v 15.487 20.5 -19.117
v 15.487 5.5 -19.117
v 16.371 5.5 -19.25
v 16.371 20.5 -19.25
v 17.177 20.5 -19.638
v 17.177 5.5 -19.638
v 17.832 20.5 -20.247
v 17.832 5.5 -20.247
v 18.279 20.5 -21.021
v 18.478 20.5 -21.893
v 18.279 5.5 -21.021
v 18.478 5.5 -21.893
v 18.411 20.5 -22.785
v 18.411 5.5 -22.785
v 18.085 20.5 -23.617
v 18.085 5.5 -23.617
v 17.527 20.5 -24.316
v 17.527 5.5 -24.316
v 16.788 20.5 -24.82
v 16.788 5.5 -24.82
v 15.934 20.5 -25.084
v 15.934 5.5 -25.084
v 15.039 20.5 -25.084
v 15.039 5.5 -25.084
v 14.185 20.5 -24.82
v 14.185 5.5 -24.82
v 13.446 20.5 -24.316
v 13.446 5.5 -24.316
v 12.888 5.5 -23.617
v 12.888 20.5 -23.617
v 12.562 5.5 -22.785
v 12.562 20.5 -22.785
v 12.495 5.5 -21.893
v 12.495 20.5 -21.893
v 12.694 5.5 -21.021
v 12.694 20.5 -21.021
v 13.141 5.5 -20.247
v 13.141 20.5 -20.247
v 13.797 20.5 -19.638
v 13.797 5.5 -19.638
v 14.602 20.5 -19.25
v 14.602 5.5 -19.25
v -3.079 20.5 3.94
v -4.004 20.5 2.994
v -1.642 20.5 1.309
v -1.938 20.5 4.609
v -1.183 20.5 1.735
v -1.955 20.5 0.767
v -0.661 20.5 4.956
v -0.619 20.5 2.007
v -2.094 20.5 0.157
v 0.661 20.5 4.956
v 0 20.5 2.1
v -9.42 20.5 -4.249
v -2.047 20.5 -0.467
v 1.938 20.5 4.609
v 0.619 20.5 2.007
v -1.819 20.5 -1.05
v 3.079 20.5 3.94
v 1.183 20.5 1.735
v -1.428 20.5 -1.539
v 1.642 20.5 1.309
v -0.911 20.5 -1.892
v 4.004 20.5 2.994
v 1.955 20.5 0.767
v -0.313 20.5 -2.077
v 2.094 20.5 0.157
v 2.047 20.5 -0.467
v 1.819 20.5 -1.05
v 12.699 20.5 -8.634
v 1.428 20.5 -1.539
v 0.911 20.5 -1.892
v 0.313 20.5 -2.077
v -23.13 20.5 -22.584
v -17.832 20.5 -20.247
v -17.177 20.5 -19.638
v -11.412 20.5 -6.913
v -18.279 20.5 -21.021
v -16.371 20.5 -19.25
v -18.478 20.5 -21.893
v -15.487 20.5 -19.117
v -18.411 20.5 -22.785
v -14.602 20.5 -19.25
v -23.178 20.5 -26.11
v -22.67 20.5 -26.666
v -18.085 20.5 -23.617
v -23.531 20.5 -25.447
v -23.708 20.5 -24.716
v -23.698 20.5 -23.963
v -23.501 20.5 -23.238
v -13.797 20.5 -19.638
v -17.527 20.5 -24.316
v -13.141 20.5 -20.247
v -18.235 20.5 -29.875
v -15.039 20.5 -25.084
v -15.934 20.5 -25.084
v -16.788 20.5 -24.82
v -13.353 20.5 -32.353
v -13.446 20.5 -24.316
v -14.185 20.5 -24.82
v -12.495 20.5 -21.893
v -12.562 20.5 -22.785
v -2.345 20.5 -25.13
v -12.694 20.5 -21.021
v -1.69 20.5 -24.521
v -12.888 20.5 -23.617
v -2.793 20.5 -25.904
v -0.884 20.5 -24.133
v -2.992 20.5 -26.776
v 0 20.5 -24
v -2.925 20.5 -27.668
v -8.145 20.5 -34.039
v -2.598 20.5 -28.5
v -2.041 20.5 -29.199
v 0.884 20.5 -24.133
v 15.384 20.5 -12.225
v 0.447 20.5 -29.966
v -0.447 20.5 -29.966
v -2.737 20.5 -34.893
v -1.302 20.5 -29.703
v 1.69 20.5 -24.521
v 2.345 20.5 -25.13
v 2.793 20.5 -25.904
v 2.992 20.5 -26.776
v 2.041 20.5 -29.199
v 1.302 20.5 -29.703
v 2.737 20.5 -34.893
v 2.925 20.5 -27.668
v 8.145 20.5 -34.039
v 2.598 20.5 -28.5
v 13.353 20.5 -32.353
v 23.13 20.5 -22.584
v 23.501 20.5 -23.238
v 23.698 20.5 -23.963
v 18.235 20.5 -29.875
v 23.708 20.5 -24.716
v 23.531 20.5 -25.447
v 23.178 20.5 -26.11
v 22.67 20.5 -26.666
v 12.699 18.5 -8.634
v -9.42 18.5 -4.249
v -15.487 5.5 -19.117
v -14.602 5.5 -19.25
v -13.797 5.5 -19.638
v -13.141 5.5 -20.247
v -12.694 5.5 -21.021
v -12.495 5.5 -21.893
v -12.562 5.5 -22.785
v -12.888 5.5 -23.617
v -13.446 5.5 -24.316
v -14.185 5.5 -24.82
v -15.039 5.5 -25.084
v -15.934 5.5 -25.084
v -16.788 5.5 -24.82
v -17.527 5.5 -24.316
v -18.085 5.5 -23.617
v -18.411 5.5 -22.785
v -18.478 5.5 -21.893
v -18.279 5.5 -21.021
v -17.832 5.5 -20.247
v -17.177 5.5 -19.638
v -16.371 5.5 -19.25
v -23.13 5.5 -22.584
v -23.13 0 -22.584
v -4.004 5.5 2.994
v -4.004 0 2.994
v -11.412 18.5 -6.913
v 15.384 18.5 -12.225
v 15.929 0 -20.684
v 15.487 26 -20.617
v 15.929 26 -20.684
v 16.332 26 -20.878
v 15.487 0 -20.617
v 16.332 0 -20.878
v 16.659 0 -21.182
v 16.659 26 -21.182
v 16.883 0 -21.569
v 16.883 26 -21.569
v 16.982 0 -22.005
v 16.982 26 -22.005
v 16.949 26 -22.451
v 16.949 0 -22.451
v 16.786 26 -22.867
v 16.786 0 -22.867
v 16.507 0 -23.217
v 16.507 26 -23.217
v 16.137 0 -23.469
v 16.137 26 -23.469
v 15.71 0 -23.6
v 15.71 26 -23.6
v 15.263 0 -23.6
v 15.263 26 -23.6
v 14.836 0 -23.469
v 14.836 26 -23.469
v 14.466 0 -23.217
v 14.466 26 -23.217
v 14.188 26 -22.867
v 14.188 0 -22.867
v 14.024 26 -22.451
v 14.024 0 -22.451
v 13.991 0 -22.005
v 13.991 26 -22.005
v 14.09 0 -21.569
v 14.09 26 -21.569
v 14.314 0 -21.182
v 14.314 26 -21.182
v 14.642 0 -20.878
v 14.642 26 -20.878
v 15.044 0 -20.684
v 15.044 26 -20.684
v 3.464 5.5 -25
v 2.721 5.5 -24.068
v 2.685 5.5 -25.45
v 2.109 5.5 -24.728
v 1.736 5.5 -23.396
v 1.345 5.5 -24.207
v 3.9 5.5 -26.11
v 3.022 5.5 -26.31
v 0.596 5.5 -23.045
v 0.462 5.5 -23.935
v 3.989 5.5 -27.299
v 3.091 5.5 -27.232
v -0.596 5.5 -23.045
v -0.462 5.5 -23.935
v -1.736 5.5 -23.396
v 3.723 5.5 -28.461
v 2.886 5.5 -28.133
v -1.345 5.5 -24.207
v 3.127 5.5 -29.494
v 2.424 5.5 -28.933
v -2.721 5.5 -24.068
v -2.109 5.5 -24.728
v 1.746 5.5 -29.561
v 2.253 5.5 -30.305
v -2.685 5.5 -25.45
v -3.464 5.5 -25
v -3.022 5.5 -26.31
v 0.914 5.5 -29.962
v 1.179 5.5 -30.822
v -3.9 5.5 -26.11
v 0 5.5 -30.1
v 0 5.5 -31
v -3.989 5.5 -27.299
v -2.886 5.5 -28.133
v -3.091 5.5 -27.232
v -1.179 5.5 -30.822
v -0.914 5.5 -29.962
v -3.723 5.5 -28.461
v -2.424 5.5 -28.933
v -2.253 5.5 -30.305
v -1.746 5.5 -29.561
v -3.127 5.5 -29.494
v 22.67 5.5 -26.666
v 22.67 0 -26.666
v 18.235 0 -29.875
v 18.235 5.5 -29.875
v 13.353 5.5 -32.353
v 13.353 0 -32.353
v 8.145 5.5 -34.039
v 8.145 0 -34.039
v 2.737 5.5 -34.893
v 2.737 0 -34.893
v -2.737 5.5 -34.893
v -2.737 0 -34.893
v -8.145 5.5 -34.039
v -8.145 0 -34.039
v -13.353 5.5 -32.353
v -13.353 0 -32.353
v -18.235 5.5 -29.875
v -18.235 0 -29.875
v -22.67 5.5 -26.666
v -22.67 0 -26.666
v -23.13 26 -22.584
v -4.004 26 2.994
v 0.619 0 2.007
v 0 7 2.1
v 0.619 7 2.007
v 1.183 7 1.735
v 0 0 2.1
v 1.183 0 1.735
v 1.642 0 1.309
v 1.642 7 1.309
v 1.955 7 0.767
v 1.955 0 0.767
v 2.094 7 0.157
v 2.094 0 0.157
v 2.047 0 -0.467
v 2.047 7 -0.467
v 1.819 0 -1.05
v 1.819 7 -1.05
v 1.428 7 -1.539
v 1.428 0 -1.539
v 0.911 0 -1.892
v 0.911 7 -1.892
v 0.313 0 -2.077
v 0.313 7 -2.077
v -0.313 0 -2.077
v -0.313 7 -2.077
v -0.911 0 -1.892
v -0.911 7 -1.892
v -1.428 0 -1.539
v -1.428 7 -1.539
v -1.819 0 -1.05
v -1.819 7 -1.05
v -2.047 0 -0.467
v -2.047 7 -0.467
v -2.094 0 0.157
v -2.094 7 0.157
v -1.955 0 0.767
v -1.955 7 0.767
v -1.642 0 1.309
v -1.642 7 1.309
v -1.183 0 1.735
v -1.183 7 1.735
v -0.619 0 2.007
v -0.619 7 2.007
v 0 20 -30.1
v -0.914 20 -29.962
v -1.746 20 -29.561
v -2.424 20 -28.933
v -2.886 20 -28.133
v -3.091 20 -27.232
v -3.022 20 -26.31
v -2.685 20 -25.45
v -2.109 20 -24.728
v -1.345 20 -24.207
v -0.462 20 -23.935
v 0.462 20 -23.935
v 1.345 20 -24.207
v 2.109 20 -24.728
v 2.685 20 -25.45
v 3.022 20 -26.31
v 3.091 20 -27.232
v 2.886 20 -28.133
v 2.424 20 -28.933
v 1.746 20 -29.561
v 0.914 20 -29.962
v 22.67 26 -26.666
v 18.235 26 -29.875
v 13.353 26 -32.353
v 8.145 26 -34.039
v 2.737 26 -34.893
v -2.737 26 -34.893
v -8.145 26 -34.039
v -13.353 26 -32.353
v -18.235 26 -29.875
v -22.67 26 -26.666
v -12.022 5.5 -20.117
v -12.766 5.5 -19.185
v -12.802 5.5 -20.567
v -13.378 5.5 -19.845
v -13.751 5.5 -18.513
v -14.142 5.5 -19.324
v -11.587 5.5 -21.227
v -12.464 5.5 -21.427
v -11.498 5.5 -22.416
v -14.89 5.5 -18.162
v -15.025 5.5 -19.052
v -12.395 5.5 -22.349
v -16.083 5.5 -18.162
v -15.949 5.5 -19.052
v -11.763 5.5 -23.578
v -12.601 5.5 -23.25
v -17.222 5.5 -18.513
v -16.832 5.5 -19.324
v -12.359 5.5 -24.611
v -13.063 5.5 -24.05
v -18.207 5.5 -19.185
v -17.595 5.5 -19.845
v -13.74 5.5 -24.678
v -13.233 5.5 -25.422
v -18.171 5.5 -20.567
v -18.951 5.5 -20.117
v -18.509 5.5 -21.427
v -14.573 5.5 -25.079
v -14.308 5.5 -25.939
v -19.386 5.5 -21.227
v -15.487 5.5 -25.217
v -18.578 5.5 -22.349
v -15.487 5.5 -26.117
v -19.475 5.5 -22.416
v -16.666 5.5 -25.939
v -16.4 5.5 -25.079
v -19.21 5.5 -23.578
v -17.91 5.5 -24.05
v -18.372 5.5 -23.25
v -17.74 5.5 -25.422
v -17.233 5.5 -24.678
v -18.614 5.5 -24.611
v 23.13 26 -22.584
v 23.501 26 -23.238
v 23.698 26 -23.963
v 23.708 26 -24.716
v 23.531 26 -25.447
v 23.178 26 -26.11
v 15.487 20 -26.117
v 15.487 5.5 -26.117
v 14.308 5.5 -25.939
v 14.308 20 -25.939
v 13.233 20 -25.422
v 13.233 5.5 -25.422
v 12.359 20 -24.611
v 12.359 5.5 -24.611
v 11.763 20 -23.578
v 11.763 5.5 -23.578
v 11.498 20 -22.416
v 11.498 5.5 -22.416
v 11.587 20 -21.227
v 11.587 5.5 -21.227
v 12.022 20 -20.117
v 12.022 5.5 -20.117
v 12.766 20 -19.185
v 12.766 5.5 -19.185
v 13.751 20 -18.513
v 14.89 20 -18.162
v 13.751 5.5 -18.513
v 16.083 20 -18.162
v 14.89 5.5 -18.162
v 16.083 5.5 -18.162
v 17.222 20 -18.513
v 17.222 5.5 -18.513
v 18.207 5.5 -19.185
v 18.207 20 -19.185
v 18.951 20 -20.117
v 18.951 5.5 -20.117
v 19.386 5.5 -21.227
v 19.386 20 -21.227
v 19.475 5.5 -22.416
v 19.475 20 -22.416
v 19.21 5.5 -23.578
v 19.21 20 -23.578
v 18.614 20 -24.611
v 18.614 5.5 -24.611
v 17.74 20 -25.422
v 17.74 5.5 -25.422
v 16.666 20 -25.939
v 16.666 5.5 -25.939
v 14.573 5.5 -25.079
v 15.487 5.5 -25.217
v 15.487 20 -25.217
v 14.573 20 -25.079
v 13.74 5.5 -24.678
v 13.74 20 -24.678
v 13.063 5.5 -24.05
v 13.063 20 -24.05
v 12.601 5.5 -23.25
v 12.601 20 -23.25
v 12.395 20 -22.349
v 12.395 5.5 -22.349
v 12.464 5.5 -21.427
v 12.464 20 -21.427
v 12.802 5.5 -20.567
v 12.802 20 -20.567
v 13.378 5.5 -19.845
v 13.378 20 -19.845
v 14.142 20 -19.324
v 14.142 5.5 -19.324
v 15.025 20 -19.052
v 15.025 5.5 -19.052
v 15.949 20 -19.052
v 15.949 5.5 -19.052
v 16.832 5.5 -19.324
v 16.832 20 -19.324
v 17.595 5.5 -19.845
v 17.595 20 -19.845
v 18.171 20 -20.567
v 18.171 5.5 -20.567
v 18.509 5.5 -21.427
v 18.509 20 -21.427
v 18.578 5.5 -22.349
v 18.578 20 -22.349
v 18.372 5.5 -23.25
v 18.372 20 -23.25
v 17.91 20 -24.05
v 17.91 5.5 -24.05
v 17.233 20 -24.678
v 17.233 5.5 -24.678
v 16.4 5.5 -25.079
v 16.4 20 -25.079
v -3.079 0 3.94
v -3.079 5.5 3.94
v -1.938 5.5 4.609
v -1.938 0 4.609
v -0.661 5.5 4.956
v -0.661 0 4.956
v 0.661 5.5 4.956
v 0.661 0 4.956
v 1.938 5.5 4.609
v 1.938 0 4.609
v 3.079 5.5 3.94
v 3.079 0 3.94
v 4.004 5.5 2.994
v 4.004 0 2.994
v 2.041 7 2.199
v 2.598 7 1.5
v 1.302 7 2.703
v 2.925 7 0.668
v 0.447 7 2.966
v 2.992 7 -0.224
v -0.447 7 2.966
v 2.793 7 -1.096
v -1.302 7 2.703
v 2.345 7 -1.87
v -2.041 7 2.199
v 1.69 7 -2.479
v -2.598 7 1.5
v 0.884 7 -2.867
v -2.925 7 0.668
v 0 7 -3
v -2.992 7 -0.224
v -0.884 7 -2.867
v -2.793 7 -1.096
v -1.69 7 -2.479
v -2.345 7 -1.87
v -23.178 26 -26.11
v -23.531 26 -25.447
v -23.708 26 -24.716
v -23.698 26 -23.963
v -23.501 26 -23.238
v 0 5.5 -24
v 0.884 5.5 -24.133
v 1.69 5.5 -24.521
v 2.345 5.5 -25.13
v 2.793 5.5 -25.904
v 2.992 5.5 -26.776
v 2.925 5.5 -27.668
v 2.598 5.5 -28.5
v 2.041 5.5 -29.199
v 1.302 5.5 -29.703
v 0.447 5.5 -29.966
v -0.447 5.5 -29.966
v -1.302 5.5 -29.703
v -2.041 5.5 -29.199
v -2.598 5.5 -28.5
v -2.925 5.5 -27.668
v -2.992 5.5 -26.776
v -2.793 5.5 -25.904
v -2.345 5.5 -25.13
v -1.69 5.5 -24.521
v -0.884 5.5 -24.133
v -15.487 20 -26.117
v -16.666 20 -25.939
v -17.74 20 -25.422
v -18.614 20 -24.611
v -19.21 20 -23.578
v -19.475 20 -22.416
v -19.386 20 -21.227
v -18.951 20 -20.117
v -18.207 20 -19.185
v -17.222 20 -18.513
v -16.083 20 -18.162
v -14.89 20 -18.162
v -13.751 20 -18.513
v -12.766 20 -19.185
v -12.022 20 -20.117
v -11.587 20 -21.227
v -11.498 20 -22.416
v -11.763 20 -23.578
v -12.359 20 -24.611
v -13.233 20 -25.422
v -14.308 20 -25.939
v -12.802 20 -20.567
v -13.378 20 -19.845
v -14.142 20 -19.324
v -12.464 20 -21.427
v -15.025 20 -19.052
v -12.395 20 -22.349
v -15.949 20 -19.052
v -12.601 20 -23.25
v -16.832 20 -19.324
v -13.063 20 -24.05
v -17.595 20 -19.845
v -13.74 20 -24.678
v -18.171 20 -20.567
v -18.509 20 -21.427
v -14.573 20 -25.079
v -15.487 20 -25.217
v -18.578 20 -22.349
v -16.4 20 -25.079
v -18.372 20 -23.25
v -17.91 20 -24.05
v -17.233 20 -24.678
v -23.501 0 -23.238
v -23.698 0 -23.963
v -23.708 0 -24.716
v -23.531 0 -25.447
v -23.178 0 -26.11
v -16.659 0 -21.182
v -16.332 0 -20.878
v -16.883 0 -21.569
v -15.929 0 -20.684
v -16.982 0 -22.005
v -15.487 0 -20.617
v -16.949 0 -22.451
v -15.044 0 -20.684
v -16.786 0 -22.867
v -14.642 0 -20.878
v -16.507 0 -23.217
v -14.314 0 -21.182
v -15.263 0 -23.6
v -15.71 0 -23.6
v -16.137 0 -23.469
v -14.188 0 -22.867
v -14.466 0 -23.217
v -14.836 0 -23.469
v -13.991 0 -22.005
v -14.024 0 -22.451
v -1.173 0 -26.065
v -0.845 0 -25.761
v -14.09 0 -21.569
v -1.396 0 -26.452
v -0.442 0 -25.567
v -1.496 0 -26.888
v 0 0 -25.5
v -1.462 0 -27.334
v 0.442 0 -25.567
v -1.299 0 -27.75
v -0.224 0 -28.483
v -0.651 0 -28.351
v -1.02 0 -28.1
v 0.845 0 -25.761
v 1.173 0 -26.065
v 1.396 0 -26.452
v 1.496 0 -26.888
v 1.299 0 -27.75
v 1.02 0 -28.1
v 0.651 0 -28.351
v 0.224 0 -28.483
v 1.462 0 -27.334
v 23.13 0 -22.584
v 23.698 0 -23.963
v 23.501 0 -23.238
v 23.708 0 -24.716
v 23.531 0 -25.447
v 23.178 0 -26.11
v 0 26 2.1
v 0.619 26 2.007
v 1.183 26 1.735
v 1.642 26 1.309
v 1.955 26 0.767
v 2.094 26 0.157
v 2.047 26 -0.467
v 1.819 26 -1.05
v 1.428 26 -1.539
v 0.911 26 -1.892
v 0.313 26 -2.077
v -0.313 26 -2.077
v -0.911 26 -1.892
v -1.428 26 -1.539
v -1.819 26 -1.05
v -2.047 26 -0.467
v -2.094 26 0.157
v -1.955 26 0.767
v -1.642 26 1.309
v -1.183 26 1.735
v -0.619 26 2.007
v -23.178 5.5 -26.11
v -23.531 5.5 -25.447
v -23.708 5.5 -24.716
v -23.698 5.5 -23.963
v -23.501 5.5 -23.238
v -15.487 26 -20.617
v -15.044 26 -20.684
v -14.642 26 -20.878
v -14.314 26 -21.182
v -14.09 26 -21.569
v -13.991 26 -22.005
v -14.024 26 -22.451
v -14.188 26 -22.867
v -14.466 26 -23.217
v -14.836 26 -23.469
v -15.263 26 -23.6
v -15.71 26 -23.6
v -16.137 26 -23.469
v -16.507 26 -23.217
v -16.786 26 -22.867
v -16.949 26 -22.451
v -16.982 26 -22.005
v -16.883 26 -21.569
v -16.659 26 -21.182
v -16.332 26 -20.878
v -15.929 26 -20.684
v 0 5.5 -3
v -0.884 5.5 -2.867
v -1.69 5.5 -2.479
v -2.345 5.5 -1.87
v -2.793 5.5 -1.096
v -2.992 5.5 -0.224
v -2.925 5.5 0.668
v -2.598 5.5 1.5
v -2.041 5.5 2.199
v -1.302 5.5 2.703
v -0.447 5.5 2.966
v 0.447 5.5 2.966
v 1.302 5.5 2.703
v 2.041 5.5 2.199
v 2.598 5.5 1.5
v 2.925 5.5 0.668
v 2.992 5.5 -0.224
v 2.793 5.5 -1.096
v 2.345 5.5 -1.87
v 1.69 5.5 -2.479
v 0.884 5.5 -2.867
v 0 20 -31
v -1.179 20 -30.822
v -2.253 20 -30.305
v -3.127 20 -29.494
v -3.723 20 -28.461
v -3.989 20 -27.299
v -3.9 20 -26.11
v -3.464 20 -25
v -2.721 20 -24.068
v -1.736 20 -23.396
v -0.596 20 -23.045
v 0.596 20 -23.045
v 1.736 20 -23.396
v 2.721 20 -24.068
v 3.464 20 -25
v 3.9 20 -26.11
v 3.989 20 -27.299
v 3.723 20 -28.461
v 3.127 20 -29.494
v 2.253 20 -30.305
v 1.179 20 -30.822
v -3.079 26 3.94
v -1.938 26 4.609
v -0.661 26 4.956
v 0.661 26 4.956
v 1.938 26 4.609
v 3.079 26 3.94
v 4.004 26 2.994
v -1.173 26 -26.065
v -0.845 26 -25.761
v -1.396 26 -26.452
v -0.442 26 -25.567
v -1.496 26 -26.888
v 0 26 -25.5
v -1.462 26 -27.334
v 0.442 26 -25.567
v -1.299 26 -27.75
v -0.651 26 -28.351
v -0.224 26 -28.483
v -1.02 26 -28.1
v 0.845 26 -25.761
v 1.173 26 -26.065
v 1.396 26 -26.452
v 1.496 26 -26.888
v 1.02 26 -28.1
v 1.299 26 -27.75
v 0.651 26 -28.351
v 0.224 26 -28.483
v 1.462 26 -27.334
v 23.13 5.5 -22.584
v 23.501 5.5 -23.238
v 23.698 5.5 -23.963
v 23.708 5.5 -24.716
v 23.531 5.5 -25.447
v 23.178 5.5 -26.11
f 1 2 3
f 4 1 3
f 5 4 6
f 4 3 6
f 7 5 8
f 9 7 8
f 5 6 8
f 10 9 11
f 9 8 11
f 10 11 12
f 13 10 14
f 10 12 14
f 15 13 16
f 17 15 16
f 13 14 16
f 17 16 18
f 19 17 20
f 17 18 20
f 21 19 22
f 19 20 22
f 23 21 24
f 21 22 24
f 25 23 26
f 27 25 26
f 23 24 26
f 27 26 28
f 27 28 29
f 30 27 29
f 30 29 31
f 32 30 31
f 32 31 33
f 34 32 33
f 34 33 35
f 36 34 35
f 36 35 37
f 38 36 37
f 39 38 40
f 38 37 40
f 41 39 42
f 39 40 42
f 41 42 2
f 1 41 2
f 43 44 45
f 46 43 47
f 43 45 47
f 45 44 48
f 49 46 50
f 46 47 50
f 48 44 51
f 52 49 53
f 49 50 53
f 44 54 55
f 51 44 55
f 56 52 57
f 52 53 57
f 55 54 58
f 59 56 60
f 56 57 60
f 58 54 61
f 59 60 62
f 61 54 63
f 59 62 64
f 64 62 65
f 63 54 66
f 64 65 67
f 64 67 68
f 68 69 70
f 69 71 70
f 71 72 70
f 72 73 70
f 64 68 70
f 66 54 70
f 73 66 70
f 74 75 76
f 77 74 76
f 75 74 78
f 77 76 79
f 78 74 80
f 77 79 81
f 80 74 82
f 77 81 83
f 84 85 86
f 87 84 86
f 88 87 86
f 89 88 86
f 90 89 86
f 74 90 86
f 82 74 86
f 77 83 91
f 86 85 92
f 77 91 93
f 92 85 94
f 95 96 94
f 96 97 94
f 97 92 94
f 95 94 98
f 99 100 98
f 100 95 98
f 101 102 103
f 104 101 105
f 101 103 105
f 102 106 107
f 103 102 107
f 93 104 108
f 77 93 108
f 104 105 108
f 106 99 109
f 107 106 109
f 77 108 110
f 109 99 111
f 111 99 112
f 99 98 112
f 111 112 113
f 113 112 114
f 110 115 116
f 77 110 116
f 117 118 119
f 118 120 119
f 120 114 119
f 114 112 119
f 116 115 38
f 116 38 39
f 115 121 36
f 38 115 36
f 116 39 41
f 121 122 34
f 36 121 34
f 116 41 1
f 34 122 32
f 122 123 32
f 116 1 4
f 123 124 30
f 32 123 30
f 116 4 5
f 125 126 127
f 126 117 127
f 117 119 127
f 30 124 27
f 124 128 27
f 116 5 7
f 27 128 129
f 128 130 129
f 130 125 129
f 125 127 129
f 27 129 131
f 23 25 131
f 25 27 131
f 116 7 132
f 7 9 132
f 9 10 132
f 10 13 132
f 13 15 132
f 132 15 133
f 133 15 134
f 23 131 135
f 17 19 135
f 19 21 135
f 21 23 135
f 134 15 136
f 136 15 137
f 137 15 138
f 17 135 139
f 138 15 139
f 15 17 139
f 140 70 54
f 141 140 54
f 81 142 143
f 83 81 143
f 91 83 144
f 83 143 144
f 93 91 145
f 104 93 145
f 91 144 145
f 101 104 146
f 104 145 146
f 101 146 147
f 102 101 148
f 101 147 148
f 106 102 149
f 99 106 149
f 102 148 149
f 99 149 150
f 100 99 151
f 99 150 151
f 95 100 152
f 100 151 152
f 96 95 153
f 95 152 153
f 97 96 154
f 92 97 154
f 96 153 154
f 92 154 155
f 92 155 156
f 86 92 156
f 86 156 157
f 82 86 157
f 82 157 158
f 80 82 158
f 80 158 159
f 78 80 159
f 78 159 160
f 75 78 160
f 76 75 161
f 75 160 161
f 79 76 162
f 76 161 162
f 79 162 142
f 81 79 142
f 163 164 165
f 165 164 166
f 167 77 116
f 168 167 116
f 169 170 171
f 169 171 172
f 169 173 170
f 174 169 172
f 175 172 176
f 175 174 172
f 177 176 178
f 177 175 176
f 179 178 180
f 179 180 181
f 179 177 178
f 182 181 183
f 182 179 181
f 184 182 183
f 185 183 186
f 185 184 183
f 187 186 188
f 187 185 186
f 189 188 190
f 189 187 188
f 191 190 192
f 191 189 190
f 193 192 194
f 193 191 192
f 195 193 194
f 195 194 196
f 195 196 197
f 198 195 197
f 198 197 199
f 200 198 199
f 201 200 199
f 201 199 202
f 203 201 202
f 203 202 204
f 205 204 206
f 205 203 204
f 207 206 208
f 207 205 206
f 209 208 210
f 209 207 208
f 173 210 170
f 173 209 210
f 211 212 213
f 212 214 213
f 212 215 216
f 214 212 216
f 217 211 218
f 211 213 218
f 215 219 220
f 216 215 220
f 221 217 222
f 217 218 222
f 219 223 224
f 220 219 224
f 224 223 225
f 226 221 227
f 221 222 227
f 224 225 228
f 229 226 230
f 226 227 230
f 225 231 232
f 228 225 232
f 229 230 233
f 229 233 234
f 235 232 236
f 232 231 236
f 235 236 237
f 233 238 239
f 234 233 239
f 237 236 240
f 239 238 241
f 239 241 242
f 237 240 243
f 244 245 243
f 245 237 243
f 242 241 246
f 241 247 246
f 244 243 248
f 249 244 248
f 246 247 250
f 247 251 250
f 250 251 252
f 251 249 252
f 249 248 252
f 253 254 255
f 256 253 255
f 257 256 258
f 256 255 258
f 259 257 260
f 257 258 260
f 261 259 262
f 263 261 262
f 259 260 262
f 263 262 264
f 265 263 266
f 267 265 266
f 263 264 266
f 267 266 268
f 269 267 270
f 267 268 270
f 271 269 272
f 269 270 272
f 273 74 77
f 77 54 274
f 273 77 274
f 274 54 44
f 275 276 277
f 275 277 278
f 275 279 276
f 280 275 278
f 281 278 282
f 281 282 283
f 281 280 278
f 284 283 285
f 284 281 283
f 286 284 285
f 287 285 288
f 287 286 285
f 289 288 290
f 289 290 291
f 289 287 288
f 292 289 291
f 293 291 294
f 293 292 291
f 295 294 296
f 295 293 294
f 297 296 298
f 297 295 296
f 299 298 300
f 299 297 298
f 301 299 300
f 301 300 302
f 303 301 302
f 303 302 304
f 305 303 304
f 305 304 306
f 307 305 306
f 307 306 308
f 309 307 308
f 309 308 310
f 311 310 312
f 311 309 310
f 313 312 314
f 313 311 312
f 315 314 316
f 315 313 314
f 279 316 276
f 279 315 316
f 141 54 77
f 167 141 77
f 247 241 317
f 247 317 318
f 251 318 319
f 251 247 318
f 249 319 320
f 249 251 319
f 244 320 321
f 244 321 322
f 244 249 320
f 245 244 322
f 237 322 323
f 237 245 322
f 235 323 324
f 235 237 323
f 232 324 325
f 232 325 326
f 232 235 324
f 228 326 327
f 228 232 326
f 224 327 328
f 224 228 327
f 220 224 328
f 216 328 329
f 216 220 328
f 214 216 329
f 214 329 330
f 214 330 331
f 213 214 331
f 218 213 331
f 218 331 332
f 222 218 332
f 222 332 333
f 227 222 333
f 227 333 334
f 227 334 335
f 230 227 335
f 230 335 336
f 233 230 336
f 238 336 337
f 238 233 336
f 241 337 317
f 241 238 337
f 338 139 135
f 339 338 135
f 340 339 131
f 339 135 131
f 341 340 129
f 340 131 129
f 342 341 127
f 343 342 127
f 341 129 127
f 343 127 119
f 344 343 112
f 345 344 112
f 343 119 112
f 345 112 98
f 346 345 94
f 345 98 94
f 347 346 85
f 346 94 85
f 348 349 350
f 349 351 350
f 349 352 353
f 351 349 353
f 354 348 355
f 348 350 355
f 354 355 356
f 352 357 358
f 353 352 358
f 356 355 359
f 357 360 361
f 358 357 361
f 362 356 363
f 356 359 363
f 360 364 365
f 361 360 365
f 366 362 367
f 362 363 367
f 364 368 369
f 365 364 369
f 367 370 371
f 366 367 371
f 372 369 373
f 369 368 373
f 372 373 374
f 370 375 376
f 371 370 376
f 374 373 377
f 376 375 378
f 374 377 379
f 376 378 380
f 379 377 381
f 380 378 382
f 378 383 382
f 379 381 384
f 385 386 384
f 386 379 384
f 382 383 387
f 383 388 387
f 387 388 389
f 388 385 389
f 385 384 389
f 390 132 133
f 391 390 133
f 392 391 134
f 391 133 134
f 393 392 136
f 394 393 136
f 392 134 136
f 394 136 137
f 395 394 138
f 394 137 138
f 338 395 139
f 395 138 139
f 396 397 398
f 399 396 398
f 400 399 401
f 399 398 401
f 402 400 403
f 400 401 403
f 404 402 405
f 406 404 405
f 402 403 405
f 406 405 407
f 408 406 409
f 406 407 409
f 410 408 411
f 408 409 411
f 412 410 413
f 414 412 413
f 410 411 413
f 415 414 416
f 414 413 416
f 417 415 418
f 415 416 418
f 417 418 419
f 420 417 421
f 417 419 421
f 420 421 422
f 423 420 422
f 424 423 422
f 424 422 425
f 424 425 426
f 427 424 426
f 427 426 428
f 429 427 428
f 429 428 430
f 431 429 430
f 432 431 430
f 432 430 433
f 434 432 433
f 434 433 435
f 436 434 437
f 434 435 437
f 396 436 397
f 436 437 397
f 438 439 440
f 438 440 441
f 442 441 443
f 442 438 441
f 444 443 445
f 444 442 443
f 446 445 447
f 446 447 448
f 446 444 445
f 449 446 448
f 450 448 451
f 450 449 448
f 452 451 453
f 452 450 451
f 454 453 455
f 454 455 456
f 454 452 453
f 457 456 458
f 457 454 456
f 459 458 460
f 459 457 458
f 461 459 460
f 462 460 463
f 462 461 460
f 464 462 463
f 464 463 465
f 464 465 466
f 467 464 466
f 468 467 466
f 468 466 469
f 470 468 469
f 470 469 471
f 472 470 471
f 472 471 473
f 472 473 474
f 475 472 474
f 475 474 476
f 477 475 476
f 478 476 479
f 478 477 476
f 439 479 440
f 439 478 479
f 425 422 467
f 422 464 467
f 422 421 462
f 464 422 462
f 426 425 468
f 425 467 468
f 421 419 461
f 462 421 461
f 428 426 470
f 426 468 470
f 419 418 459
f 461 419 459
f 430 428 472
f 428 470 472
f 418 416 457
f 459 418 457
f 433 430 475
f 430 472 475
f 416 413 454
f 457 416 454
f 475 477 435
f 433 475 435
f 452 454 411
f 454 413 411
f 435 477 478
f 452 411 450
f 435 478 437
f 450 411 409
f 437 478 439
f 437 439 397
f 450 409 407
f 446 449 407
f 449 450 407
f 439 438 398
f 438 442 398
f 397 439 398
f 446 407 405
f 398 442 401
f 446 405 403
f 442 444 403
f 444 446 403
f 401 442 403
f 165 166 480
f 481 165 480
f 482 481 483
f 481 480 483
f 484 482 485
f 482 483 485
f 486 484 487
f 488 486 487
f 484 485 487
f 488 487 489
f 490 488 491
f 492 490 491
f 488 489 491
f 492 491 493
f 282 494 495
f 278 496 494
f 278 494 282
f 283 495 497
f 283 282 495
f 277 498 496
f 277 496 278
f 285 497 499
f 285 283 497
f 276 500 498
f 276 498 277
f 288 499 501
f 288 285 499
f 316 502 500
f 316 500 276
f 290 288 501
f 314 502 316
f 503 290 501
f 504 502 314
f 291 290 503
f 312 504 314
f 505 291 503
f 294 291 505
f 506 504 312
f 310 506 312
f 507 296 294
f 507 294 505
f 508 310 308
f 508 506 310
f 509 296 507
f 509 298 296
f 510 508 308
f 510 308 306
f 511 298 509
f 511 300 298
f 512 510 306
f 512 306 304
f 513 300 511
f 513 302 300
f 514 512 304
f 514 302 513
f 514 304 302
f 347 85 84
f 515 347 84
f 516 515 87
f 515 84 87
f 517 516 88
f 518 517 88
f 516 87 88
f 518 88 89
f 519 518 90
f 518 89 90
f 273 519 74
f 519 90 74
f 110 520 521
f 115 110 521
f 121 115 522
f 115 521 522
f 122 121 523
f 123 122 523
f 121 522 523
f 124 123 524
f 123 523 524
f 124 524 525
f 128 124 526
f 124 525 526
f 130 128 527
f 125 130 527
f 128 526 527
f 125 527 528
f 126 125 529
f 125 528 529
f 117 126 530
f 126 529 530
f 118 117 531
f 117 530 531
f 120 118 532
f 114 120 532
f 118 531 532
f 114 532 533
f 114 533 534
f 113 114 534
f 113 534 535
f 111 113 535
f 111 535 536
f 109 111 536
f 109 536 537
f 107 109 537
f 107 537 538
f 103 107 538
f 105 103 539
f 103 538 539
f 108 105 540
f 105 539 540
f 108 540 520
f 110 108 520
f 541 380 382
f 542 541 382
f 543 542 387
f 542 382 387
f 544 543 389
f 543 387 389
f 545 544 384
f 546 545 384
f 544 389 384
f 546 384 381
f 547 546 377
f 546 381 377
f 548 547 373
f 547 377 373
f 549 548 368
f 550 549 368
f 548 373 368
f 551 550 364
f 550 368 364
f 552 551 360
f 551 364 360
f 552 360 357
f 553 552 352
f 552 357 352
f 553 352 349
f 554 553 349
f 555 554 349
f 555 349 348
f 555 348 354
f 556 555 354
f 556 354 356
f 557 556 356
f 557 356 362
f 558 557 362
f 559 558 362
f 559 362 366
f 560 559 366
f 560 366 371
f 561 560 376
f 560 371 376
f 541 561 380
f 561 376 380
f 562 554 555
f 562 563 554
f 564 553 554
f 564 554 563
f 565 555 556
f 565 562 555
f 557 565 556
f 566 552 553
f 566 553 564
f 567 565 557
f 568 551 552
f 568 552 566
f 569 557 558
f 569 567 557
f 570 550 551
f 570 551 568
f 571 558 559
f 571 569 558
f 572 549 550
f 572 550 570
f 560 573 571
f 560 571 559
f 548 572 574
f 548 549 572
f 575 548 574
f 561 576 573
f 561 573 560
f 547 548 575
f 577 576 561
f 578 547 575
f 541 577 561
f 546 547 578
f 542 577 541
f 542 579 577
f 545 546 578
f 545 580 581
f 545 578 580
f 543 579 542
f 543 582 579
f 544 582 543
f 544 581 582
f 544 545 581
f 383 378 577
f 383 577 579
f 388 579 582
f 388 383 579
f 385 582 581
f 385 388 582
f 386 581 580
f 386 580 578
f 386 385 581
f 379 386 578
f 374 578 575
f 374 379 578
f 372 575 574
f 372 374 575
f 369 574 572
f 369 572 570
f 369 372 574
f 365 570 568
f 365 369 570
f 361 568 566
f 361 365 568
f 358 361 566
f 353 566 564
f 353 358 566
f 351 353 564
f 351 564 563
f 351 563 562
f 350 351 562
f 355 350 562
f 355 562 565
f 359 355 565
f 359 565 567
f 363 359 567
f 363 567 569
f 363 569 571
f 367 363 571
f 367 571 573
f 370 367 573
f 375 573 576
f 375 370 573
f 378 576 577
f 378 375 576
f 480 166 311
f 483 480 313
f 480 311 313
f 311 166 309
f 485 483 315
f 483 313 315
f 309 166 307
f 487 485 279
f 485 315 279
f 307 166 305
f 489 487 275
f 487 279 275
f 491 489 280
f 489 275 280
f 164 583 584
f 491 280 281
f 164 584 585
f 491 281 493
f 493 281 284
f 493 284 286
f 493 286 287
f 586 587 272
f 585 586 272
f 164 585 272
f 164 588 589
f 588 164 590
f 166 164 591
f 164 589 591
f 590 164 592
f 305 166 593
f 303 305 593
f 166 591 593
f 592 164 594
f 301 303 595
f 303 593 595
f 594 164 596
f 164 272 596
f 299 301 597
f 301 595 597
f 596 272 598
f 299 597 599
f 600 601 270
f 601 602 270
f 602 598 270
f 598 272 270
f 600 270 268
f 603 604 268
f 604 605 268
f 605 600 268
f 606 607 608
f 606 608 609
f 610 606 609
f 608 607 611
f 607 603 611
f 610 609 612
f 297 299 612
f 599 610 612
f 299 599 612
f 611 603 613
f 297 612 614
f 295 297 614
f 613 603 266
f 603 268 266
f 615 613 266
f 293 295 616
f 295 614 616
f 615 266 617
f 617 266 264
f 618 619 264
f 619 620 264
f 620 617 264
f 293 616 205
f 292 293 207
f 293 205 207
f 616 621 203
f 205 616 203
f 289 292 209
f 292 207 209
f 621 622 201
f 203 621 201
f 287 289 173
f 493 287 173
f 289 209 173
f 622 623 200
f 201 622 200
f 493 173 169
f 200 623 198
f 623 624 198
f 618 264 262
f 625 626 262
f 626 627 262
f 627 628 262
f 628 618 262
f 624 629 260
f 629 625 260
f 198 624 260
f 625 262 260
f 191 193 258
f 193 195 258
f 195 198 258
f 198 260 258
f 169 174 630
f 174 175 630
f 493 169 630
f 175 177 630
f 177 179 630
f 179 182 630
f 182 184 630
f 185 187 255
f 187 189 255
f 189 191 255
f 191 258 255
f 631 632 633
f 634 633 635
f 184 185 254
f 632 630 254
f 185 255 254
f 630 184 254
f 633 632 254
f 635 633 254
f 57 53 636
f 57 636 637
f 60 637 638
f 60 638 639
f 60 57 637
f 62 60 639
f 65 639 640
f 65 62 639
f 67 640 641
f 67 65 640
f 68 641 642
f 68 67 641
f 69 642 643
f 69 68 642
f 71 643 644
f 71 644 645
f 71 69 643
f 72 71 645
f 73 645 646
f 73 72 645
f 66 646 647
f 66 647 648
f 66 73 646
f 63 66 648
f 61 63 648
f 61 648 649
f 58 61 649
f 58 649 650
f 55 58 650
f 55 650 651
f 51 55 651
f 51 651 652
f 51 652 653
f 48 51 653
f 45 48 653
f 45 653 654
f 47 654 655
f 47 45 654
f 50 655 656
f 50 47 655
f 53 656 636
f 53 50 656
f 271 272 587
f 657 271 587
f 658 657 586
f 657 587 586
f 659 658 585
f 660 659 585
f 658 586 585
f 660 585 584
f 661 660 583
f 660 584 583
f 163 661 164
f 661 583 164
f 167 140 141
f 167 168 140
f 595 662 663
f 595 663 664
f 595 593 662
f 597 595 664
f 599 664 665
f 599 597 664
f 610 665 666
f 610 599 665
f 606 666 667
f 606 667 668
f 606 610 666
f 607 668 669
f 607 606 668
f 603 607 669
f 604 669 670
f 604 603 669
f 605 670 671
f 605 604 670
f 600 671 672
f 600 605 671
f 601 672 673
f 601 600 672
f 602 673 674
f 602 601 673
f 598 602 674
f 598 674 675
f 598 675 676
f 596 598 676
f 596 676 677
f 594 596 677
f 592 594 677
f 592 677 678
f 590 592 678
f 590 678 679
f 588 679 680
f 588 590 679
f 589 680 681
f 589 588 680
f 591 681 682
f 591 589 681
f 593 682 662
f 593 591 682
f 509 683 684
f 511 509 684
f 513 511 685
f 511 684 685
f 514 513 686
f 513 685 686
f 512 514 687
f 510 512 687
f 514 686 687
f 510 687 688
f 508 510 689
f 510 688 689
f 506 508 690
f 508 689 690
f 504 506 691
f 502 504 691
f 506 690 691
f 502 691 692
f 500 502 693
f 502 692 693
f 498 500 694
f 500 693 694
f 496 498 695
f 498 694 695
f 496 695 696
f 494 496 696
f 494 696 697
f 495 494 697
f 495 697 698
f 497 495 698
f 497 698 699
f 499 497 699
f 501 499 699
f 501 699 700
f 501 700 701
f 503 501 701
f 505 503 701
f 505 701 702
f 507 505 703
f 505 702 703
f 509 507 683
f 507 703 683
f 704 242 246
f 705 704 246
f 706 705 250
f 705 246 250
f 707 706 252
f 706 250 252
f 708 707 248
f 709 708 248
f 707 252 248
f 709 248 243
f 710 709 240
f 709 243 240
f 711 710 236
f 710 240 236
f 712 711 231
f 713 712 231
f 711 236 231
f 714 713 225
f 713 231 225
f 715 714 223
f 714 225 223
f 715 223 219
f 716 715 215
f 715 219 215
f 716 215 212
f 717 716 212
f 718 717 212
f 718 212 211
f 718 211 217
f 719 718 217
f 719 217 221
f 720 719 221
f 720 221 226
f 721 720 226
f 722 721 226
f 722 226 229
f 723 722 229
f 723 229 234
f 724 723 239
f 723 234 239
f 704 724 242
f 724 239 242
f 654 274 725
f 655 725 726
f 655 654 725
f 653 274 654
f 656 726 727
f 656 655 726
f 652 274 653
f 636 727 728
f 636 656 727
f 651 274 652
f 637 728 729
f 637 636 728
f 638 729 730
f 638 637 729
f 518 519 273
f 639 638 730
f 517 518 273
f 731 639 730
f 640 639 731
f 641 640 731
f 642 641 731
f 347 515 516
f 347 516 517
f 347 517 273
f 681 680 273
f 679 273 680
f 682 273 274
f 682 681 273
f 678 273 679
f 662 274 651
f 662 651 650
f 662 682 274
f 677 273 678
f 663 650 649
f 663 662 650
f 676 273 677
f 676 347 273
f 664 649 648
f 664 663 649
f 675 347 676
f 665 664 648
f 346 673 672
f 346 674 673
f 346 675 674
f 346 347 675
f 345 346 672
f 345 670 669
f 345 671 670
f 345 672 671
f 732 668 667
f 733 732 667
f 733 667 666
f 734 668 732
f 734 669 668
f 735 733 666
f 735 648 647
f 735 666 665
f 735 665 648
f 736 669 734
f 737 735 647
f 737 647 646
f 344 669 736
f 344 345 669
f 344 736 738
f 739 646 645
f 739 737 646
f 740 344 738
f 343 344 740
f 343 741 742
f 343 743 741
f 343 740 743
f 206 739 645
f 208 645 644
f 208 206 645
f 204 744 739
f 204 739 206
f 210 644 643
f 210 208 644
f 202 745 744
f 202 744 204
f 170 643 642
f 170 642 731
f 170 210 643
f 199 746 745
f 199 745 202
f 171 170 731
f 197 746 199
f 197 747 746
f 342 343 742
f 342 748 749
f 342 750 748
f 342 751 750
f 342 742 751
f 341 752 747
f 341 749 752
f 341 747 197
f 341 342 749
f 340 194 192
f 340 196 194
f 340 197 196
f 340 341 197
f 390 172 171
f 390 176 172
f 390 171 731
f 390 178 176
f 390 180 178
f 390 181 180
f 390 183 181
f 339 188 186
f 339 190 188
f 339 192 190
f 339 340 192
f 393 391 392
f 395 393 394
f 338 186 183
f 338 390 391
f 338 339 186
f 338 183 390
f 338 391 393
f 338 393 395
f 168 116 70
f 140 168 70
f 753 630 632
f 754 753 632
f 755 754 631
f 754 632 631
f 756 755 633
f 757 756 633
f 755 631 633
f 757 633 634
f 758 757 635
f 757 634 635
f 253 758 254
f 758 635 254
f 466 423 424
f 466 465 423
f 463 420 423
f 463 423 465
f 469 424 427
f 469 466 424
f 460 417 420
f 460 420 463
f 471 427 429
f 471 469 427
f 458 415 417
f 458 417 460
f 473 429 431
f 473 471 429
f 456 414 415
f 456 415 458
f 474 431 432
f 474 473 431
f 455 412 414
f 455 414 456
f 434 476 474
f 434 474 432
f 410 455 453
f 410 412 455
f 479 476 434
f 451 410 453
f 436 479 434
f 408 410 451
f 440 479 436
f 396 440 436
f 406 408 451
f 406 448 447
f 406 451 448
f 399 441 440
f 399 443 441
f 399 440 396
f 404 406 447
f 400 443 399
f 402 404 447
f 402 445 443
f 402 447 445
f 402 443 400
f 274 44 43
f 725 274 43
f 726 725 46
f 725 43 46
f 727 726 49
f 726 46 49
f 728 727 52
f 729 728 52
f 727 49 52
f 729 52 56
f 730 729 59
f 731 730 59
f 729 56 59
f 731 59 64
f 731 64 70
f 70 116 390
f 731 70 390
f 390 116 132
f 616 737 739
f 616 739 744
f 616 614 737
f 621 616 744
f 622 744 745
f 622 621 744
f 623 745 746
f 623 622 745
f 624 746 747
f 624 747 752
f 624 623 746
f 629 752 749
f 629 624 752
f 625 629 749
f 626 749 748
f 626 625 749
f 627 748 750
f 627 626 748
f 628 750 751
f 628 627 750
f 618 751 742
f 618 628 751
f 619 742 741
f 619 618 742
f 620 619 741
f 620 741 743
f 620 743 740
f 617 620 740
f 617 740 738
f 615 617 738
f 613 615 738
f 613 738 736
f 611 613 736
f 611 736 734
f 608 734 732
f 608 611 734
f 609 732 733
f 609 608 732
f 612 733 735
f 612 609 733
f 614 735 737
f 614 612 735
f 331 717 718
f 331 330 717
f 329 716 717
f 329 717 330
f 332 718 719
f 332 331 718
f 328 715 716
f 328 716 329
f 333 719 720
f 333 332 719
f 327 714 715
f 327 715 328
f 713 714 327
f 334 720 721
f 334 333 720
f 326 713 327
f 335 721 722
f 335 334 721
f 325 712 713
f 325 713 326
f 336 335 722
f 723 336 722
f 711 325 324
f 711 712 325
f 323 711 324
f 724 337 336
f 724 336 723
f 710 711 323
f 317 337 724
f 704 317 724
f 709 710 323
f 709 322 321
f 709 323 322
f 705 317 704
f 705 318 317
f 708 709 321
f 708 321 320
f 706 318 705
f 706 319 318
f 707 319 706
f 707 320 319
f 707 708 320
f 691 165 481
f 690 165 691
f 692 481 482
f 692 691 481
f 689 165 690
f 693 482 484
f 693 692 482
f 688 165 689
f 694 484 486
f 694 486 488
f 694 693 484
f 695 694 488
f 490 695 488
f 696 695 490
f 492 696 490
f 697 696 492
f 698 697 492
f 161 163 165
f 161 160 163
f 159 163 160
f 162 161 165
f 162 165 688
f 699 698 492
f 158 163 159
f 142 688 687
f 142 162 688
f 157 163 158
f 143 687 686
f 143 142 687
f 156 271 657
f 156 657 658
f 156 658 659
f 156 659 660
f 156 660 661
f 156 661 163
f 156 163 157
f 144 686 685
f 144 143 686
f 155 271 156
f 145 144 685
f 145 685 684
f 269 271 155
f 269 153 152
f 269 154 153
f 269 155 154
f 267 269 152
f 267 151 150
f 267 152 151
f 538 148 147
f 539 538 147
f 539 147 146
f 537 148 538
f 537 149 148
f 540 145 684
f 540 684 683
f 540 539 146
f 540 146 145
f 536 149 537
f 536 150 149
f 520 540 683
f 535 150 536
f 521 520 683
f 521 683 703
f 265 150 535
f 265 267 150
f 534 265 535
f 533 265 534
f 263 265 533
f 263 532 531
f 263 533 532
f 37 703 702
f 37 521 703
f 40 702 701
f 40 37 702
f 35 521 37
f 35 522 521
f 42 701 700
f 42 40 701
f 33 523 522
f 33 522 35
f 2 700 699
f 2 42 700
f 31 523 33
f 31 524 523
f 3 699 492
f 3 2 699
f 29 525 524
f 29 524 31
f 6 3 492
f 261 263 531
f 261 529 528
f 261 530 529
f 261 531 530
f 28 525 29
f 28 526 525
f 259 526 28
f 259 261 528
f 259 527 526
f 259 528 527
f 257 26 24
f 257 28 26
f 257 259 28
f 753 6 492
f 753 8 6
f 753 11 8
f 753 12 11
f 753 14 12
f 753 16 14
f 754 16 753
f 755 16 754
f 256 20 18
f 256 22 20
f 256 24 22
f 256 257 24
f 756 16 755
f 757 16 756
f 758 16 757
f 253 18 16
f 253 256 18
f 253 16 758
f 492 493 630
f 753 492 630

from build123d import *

# Parameters (mm, degrees)
SKETCH_1_R        = 2.1
SKETCH_1_R_2      = 1.5
EXTRUDE_1_DEPTH   = 5.5
SKETCH_2_R        = 3
SKETCH_2_R_2      = 1.5
EXTRUDE_2_DEPTH   = 15
EXTRUDE_2_2_DEPTH = 15
EXTRUDE_2_3_DEPTH = 15
SKETCH_3_R        = 4
SKETCH_3_R_2      = 3.1
EXTRUDE_3_DEPTH   = 14.5
EXTRUDE_3_2_DEPTH = 14.5
EXTRUDE_3_3_DEPTH = 14.5
EXTRUDE_START     = 20.5
SKETCH_1_2_R      = 2.1
SKETCH_1_2_R_2    = 1.5
EXTRUDE_4_DEPTH   = 5.5
SKETCH_4_R        = 3
SKETCH_4_R_2      = 2.1
EXTRUDE_5_DEPTH   = 1.5
EXTRUDE_6_DEPTH   = 2


with BuildPart() as part:
    # ｽｹｯﾁ1 → ﾎﾞｽ - 押し出し1 (new body)
    with BuildSketch(Plane(origin=(0, 0, 0), x_dir=(1, 0, 0), z_dir=(0, 1, 0))):
        with BuildLine():
            Line((-23.129729925, 22.583524826), (-4.004347333, -2.994194789))
            ThreePointArc((-4.004347333, -2.994194789), (0, -5), (4.004347333, -2.994194789))
            Line((4.004347333, -2.994194789), (23.129729925, 22.583524826))
            ThreePointArc((23.129729925, 22.583524826), (23.708299296, 24.715569788), (22.670289168, 26.665670609))
            ThreePointArc((22.670289168, 26.665670609), (0, 35), (-22.670289168, 26.665670609))
            ThreePointArc((-22.670289168, 26.665670609), (-23.708299296, 24.715569788), (-23.129729925, 22.583524826))
        make_face()
        with Locations(Location((0, 0, 0), (0, 0, 270))):
            Circle(SKETCH_1_R, mode=Mode.SUBTRACT)
        with Locations(Location((-15.486563781, 22.117105196, 0), (0, 0, 270))):
            Circle(SKETCH_1_R_2, mode=Mode.SUBTRACT)
        with Locations(Location((15.486563781, 22.117105196, 0), (0, 0, 270))):
            Circle(SKETCH_1_R_2, mode=Mode.SUBTRACT)
        with Locations(Location((0, 27, 0), (0, 0, 270))):
            Circle(SKETCH_1_R_2, mode=Mode.SUBTRACT)
    extrude(amount=EXTRUDE_1_DEPTH)



with BuildPart() as body_2:
    # ｽｹｯﾁ2 → ﾎﾞｽ - 押し出し2 (new body)
    with BuildSketch(Plane(origin=(0, 5.5, 0), x_dir=(1, 0, 0), z_dir=(0, 1, 0))):
        with Locations(Location((0, 27, 0), (0, 0, 270))):
            Circle(SKETCH_2_R)
        with Locations(Location((0, 27, 0), (0, 0, 270))):
            Circle(SKETCH_2_R_2, mode=Mode.SUBTRACT)
    extrude(amount=EXTRUDE_2_DEPTH)



with BuildPart() as body_3:
    # ｽｹｯﾁ2 → Extrude 2 2 (new body)
    with BuildSketch(Plane(origin=(0, 5.5, 0), x_dir=(1, 0, 0), z_dir=(0, 1, 0))):
        with Locations(Location((15.486563781, 22.117105196, 0), (0, 0, 270))):
            Circle(SKETCH_2_R)
        with Locations(Location((15.486563781, 22.117105196, 0), (0, 0, 270))):
            Circle(SKETCH_2_R_2, mode=Mode.SUBTRACT)
    extrude(amount=EXTRUDE_2_2_DEPTH)


with BuildPart() as body_4:
    # ｽｹｯﾁ2 → Extrude 2 3 (new body)
    with BuildSketch(Plane(origin=(0, 5.5, 0), x_dir=(1, 0, 0), z_dir=(0, 1, 0))):
        with Locations(Location((-15.486563781, 22.117105196, 0), (0, 0, 270))):
            Circle(SKETCH_2_R)
        with Locations(Location((-15.486563781, 22.117105196, 0), (0, 0, 270))):
            Circle(SKETCH_2_R_2, mode=Mode.SUBTRACT)
    extrude(amount=EXTRUDE_2_3_DEPTH)


with BuildPart() as body_5:
    # ｽｹｯﾁ3 → ﾎﾞｽ - 押し出し3 (new body)
    with BuildSketch(Plane(origin=(0, 5.5, 0), x_dir=(1, 0, 0), z_dir=(0, 1, 0))):
        with Locations(Location((-15.486563781, 22.117105196, 0), (0, 0, 90))):
            Circle(SKETCH_3_R)
        with Locations(Location((-15.486563781, 22.117105196, 0), (0, 0, 90))):
            Circle(SKETCH_3_R_2, mode=Mode.SUBTRACT)
    extrude(amount=EXTRUDE_3_DEPTH)


with BuildPart() as body_6:
    # ｽｹｯﾁ3 → Extrude 3 2 (new body)
    with BuildSketch(Plane(origin=(0, 5.5, 0), x_dir=(1, 0, 0), z_dir=(0, 1, 0))):
        with Locations(Location((0, 27, 0), (0, 0, 90))):
            Circle(SKETCH_3_R)
        with Locations(Location((0, 27, 0), (0, 0, 90))):
            Circle(SKETCH_3_R_2, mode=Mode.SUBTRACT)
    extrude(amount=EXTRUDE_3_2_DEPTH)


with BuildPart() as body_7:
    # ｽｹｯﾁ3 → Extrude 3 3 (new body)
    with BuildSketch(Plane(origin=(0, 5.5, 0), x_dir=(1, 0, 0), z_dir=(0, 1, 0))):
        with Locations(Location((15.486563781, 22.117105196, 0), (0, 0, 90))):
            Circle(SKETCH_3_R)
        with Locations(Location((15.486563781, 22.117105196, 0), (0, 0, 90))):
            Circle(SKETCH_3_R_2, mode=Mode.SUBTRACT)
    extrude(amount=EXTRUDE_3_3_DEPTH)


with BuildPart() as body_2_1:
    add(body_2.part)

    add(body_3.part)  # ﾎﾞｽ - 押し出し4 merges body 3

    add(body_4.part)  # ﾎﾞｽ - 押し出し4 merges body 4
    # ｽｹｯﾁ1<2> → ﾎﾞｽ - 押し出し4 (add)
    with BuildSketch(Plane(origin=(0, 0, 0), x_dir=(1, 0, 0), z_dir=(0, 1, 0)).offset(EXTRUDE_START)):
        with BuildLine():
            Line((-23.129729925, 22.583524826), (-4.004347333, -2.994194789))
            ThreePointArc((-4.004347333, -2.994194789), (0, -5), (4.004347333, -2.994194789))
            Line((4.004347333, -2.994194789), (23.129729925, 22.583524826))
            ThreePointArc((23.129729925, 22.583524826), (23.708299296, 24.715569788), (22.670289168, 26.665670609))
            ThreePointArc((22.670289168, 26.665670609), (0, 35), (-22.670289168, 26.665670609))
            ThreePointArc((-22.670289168, 26.665670609), (-23.708299296, 24.715569788), (-23.129729925, 22.583524826))
        make_face()
        with Locations(Location((0, 0, 0), (0, 0, 270))):
            Circle(SKETCH_1_2_R, mode=Mode.SUBTRACT)
        with Locations(Location((-15.486563781, 22.117105196, 0), (0, 0, 270))):
            Circle(SKETCH_1_2_R_2, mode=Mode.SUBTRACT)
        with Locations(Location((15.486563781, 22.117105196, 0), (0, 0, 270))):
            Circle(SKETCH_1_2_R_2, mode=Mode.SUBTRACT)
        with Locations(Location((0, 27, 0), (0, 0, 270))):
            Circle(SKETCH_1_2_R_2, mode=Mode.SUBTRACT)
    extrude(amount=EXTRUDE_4_DEPTH)


with BuildPart() as part_1:
    add(part.part)

    add(body_2_1.part)  # ﾎﾞｽ - 押し出し5 merges body 2
    # ｽｹｯﾁ4 → ﾎﾞｽ - 押し出し5 (add)
    with BuildSketch(Plane(origin=(0, 5.5, 0), x_dir=(1, 0, 0), z_dir=(0, 1, 0))):
        with Locations(Location((0, 0, 0), (0, 0, 90))):
            Circle(SKETCH_4_R)
        with Locations(Location((0, 0, 0), (0, 0, 270))):
            Circle(SKETCH_4_R_2, mode=Mode.SUBTRACT)
    extrude(amount=EXTRUDE_5_DEPTH)

    # ｽｹｯﾁ5 → ﾎﾞｽ - 押し出し6 (add)
    with BuildSketch(Plane(origin=(0, 20.5, 0), x_dir=(-1, 0, 0), z_dir=(0, -1, 0))):
        Polygon((-12.699442215, 8.634367298), (9.420495568, 4.249201273), (11.412129463, 6.912753392), (-15.384294553, 12.22500921), align=None)
    extrude(amount=EXTRUDE_6_DEPTH)


solid = Compound([body_5.part, body_6.part, body_7.part, part_1.part])
